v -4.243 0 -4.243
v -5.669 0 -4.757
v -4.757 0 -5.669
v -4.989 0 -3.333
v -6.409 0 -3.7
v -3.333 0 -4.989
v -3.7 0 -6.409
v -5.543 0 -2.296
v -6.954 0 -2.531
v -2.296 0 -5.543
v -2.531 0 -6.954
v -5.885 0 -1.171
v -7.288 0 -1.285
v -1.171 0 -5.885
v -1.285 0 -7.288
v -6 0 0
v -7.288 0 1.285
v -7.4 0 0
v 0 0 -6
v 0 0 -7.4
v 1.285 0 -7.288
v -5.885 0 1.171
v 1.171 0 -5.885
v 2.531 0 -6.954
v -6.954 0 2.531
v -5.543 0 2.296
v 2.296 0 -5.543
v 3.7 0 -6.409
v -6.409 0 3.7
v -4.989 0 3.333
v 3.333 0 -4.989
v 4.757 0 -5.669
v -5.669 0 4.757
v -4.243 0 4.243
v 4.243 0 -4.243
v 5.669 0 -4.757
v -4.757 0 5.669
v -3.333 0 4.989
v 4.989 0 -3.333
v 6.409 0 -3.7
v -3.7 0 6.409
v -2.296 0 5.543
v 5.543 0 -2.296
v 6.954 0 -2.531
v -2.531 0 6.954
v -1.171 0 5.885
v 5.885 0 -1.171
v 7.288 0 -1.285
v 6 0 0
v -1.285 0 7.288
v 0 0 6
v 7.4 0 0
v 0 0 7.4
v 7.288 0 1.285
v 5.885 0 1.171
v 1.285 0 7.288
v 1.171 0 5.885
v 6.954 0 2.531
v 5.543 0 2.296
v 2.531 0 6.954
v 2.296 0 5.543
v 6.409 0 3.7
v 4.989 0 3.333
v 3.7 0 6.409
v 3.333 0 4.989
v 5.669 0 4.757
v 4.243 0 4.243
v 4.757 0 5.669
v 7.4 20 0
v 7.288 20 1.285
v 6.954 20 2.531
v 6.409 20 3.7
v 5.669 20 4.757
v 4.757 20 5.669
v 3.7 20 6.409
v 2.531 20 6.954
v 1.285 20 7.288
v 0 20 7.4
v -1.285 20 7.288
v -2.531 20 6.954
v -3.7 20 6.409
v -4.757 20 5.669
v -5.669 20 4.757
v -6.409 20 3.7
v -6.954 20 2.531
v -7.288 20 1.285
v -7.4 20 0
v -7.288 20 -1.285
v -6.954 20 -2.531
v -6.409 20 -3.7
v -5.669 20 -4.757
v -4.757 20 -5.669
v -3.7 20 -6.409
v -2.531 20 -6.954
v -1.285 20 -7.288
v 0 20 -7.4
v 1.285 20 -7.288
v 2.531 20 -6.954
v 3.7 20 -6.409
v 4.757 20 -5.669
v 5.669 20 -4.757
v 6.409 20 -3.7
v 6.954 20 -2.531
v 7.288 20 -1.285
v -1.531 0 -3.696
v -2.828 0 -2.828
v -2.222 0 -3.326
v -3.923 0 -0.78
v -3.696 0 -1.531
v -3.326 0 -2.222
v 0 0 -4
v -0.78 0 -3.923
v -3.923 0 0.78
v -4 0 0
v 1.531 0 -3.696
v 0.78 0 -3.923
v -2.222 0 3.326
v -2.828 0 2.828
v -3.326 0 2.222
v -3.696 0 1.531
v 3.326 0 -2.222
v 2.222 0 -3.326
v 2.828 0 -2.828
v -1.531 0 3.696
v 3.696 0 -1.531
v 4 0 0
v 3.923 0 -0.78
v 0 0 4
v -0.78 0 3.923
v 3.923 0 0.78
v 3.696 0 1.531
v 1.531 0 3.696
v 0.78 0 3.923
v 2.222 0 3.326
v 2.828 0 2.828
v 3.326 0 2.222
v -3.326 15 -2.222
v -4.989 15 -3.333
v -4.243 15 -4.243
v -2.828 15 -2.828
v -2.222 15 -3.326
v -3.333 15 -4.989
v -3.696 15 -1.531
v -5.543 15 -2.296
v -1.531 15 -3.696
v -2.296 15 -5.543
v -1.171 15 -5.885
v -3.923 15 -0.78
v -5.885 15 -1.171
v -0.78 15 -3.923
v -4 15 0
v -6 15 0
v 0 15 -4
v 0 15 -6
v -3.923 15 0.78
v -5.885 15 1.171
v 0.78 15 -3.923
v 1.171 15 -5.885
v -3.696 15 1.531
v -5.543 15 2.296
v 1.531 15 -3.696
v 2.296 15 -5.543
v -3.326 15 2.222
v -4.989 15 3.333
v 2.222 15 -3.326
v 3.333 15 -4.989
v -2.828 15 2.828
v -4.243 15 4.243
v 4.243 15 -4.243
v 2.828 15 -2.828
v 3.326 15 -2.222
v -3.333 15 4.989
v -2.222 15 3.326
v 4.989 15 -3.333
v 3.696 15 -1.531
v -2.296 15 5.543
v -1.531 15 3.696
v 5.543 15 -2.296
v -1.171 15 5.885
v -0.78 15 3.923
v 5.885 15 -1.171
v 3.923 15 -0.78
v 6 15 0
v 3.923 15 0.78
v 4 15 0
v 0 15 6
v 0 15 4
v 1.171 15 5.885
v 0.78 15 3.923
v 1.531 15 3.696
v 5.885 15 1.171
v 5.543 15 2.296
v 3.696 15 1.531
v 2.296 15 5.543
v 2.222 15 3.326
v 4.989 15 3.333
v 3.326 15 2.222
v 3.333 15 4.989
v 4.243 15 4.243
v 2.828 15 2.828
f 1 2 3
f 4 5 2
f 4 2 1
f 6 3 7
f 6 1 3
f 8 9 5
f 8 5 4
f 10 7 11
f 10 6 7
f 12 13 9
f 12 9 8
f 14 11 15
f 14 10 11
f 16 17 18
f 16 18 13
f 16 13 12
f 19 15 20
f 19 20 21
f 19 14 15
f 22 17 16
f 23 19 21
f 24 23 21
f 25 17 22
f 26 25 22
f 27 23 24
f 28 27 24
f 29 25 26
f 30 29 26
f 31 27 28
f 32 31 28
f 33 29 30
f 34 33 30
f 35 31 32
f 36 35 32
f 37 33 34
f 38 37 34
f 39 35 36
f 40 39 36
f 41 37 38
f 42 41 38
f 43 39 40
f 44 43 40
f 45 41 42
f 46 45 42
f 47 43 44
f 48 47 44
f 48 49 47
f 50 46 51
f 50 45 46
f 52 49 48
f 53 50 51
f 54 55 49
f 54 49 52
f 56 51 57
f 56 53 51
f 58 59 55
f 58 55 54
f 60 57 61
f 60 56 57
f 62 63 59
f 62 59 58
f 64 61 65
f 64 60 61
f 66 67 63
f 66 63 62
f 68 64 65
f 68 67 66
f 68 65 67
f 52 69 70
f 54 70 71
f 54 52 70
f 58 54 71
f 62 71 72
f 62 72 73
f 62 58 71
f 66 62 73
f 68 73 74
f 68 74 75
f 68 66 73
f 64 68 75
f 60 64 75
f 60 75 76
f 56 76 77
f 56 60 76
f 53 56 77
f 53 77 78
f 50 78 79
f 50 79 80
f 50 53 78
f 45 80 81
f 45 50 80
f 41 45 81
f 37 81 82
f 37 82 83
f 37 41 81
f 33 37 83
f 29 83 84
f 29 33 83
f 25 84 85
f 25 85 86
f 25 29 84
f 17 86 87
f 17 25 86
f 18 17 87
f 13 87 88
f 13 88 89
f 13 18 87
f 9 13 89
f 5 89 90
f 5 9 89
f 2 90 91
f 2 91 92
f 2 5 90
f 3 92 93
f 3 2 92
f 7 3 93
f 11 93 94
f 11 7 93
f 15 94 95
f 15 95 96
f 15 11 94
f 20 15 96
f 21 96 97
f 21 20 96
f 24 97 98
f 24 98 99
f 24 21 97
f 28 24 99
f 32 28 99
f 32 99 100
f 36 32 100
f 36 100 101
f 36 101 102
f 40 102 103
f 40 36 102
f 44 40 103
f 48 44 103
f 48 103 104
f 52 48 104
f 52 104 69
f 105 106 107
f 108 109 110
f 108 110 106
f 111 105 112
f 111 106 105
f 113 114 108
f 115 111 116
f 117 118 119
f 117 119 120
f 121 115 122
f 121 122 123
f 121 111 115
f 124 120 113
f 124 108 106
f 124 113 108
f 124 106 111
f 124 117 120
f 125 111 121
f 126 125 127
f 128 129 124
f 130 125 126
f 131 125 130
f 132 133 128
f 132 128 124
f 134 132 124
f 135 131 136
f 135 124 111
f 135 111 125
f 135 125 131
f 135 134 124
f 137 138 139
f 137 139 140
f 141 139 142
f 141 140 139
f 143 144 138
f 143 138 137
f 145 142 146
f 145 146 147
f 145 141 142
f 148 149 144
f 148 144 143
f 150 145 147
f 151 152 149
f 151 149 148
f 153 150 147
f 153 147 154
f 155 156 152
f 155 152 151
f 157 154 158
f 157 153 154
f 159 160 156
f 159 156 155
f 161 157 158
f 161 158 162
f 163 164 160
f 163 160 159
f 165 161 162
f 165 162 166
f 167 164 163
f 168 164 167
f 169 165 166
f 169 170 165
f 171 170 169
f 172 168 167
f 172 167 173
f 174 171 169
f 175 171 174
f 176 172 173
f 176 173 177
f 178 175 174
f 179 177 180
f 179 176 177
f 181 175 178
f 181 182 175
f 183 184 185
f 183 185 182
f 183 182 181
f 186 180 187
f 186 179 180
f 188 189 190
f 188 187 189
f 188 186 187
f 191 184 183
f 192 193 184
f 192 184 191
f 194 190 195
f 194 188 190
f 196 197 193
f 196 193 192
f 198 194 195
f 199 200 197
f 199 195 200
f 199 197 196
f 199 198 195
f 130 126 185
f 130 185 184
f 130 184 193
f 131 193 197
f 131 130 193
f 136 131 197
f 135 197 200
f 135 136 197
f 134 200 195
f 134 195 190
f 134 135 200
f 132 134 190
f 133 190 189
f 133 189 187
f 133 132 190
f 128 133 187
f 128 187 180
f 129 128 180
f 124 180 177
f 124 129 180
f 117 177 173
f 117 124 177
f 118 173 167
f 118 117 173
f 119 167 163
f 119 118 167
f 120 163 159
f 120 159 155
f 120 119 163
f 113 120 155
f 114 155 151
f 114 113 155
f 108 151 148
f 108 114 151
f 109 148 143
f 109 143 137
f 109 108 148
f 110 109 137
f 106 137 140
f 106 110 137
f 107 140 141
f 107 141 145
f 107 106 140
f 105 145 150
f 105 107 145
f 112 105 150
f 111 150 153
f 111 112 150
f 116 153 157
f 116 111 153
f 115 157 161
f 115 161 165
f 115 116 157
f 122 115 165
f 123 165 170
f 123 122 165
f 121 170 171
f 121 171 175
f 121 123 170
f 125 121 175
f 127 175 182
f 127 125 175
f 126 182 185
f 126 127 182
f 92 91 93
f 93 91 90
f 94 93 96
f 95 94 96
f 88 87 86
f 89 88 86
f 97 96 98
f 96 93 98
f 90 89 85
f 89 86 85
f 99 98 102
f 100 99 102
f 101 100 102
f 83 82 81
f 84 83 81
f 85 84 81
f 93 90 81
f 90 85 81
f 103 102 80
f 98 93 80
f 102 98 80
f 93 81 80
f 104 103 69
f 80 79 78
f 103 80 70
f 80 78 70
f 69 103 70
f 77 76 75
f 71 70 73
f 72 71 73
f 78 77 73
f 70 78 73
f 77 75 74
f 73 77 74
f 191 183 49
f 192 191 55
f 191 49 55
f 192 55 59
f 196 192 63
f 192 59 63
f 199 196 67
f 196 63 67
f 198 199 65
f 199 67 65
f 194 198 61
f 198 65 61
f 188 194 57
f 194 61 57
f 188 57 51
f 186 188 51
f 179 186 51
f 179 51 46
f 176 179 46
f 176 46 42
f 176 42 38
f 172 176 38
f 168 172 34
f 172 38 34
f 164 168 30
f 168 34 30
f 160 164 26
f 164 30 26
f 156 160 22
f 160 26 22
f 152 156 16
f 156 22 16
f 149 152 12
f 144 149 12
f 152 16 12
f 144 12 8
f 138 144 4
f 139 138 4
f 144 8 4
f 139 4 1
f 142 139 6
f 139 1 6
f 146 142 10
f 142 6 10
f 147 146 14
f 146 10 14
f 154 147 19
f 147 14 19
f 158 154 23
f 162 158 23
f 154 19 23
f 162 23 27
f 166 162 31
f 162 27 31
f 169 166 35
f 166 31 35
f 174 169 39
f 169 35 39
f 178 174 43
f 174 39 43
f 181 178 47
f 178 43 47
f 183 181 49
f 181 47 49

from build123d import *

# Parameters (mm, degrees)
F0_R     = 7.4
F1_DEPTH = 20
F2_R     = 6
F2_R_2   = 4
F3_DEPTH = 15


with BuildPart() as f1:
    # F0 (on Front) → F1 (new body)
    with BuildSketch(Plane.XZ):
        Circle(F0_R)
    extrude(amount=-F1_DEPTH)

    # F2 (on face) → F3 (cut)
    with BuildSketch(Plane.XZ):
        Circle(F2_R)
        Circle(F2_R_2, mode=Mode.SUBTRACT)
    extrude(amount=-F3_DEPTH, mode=Mode.SUBTRACT)


solid = f1.part
